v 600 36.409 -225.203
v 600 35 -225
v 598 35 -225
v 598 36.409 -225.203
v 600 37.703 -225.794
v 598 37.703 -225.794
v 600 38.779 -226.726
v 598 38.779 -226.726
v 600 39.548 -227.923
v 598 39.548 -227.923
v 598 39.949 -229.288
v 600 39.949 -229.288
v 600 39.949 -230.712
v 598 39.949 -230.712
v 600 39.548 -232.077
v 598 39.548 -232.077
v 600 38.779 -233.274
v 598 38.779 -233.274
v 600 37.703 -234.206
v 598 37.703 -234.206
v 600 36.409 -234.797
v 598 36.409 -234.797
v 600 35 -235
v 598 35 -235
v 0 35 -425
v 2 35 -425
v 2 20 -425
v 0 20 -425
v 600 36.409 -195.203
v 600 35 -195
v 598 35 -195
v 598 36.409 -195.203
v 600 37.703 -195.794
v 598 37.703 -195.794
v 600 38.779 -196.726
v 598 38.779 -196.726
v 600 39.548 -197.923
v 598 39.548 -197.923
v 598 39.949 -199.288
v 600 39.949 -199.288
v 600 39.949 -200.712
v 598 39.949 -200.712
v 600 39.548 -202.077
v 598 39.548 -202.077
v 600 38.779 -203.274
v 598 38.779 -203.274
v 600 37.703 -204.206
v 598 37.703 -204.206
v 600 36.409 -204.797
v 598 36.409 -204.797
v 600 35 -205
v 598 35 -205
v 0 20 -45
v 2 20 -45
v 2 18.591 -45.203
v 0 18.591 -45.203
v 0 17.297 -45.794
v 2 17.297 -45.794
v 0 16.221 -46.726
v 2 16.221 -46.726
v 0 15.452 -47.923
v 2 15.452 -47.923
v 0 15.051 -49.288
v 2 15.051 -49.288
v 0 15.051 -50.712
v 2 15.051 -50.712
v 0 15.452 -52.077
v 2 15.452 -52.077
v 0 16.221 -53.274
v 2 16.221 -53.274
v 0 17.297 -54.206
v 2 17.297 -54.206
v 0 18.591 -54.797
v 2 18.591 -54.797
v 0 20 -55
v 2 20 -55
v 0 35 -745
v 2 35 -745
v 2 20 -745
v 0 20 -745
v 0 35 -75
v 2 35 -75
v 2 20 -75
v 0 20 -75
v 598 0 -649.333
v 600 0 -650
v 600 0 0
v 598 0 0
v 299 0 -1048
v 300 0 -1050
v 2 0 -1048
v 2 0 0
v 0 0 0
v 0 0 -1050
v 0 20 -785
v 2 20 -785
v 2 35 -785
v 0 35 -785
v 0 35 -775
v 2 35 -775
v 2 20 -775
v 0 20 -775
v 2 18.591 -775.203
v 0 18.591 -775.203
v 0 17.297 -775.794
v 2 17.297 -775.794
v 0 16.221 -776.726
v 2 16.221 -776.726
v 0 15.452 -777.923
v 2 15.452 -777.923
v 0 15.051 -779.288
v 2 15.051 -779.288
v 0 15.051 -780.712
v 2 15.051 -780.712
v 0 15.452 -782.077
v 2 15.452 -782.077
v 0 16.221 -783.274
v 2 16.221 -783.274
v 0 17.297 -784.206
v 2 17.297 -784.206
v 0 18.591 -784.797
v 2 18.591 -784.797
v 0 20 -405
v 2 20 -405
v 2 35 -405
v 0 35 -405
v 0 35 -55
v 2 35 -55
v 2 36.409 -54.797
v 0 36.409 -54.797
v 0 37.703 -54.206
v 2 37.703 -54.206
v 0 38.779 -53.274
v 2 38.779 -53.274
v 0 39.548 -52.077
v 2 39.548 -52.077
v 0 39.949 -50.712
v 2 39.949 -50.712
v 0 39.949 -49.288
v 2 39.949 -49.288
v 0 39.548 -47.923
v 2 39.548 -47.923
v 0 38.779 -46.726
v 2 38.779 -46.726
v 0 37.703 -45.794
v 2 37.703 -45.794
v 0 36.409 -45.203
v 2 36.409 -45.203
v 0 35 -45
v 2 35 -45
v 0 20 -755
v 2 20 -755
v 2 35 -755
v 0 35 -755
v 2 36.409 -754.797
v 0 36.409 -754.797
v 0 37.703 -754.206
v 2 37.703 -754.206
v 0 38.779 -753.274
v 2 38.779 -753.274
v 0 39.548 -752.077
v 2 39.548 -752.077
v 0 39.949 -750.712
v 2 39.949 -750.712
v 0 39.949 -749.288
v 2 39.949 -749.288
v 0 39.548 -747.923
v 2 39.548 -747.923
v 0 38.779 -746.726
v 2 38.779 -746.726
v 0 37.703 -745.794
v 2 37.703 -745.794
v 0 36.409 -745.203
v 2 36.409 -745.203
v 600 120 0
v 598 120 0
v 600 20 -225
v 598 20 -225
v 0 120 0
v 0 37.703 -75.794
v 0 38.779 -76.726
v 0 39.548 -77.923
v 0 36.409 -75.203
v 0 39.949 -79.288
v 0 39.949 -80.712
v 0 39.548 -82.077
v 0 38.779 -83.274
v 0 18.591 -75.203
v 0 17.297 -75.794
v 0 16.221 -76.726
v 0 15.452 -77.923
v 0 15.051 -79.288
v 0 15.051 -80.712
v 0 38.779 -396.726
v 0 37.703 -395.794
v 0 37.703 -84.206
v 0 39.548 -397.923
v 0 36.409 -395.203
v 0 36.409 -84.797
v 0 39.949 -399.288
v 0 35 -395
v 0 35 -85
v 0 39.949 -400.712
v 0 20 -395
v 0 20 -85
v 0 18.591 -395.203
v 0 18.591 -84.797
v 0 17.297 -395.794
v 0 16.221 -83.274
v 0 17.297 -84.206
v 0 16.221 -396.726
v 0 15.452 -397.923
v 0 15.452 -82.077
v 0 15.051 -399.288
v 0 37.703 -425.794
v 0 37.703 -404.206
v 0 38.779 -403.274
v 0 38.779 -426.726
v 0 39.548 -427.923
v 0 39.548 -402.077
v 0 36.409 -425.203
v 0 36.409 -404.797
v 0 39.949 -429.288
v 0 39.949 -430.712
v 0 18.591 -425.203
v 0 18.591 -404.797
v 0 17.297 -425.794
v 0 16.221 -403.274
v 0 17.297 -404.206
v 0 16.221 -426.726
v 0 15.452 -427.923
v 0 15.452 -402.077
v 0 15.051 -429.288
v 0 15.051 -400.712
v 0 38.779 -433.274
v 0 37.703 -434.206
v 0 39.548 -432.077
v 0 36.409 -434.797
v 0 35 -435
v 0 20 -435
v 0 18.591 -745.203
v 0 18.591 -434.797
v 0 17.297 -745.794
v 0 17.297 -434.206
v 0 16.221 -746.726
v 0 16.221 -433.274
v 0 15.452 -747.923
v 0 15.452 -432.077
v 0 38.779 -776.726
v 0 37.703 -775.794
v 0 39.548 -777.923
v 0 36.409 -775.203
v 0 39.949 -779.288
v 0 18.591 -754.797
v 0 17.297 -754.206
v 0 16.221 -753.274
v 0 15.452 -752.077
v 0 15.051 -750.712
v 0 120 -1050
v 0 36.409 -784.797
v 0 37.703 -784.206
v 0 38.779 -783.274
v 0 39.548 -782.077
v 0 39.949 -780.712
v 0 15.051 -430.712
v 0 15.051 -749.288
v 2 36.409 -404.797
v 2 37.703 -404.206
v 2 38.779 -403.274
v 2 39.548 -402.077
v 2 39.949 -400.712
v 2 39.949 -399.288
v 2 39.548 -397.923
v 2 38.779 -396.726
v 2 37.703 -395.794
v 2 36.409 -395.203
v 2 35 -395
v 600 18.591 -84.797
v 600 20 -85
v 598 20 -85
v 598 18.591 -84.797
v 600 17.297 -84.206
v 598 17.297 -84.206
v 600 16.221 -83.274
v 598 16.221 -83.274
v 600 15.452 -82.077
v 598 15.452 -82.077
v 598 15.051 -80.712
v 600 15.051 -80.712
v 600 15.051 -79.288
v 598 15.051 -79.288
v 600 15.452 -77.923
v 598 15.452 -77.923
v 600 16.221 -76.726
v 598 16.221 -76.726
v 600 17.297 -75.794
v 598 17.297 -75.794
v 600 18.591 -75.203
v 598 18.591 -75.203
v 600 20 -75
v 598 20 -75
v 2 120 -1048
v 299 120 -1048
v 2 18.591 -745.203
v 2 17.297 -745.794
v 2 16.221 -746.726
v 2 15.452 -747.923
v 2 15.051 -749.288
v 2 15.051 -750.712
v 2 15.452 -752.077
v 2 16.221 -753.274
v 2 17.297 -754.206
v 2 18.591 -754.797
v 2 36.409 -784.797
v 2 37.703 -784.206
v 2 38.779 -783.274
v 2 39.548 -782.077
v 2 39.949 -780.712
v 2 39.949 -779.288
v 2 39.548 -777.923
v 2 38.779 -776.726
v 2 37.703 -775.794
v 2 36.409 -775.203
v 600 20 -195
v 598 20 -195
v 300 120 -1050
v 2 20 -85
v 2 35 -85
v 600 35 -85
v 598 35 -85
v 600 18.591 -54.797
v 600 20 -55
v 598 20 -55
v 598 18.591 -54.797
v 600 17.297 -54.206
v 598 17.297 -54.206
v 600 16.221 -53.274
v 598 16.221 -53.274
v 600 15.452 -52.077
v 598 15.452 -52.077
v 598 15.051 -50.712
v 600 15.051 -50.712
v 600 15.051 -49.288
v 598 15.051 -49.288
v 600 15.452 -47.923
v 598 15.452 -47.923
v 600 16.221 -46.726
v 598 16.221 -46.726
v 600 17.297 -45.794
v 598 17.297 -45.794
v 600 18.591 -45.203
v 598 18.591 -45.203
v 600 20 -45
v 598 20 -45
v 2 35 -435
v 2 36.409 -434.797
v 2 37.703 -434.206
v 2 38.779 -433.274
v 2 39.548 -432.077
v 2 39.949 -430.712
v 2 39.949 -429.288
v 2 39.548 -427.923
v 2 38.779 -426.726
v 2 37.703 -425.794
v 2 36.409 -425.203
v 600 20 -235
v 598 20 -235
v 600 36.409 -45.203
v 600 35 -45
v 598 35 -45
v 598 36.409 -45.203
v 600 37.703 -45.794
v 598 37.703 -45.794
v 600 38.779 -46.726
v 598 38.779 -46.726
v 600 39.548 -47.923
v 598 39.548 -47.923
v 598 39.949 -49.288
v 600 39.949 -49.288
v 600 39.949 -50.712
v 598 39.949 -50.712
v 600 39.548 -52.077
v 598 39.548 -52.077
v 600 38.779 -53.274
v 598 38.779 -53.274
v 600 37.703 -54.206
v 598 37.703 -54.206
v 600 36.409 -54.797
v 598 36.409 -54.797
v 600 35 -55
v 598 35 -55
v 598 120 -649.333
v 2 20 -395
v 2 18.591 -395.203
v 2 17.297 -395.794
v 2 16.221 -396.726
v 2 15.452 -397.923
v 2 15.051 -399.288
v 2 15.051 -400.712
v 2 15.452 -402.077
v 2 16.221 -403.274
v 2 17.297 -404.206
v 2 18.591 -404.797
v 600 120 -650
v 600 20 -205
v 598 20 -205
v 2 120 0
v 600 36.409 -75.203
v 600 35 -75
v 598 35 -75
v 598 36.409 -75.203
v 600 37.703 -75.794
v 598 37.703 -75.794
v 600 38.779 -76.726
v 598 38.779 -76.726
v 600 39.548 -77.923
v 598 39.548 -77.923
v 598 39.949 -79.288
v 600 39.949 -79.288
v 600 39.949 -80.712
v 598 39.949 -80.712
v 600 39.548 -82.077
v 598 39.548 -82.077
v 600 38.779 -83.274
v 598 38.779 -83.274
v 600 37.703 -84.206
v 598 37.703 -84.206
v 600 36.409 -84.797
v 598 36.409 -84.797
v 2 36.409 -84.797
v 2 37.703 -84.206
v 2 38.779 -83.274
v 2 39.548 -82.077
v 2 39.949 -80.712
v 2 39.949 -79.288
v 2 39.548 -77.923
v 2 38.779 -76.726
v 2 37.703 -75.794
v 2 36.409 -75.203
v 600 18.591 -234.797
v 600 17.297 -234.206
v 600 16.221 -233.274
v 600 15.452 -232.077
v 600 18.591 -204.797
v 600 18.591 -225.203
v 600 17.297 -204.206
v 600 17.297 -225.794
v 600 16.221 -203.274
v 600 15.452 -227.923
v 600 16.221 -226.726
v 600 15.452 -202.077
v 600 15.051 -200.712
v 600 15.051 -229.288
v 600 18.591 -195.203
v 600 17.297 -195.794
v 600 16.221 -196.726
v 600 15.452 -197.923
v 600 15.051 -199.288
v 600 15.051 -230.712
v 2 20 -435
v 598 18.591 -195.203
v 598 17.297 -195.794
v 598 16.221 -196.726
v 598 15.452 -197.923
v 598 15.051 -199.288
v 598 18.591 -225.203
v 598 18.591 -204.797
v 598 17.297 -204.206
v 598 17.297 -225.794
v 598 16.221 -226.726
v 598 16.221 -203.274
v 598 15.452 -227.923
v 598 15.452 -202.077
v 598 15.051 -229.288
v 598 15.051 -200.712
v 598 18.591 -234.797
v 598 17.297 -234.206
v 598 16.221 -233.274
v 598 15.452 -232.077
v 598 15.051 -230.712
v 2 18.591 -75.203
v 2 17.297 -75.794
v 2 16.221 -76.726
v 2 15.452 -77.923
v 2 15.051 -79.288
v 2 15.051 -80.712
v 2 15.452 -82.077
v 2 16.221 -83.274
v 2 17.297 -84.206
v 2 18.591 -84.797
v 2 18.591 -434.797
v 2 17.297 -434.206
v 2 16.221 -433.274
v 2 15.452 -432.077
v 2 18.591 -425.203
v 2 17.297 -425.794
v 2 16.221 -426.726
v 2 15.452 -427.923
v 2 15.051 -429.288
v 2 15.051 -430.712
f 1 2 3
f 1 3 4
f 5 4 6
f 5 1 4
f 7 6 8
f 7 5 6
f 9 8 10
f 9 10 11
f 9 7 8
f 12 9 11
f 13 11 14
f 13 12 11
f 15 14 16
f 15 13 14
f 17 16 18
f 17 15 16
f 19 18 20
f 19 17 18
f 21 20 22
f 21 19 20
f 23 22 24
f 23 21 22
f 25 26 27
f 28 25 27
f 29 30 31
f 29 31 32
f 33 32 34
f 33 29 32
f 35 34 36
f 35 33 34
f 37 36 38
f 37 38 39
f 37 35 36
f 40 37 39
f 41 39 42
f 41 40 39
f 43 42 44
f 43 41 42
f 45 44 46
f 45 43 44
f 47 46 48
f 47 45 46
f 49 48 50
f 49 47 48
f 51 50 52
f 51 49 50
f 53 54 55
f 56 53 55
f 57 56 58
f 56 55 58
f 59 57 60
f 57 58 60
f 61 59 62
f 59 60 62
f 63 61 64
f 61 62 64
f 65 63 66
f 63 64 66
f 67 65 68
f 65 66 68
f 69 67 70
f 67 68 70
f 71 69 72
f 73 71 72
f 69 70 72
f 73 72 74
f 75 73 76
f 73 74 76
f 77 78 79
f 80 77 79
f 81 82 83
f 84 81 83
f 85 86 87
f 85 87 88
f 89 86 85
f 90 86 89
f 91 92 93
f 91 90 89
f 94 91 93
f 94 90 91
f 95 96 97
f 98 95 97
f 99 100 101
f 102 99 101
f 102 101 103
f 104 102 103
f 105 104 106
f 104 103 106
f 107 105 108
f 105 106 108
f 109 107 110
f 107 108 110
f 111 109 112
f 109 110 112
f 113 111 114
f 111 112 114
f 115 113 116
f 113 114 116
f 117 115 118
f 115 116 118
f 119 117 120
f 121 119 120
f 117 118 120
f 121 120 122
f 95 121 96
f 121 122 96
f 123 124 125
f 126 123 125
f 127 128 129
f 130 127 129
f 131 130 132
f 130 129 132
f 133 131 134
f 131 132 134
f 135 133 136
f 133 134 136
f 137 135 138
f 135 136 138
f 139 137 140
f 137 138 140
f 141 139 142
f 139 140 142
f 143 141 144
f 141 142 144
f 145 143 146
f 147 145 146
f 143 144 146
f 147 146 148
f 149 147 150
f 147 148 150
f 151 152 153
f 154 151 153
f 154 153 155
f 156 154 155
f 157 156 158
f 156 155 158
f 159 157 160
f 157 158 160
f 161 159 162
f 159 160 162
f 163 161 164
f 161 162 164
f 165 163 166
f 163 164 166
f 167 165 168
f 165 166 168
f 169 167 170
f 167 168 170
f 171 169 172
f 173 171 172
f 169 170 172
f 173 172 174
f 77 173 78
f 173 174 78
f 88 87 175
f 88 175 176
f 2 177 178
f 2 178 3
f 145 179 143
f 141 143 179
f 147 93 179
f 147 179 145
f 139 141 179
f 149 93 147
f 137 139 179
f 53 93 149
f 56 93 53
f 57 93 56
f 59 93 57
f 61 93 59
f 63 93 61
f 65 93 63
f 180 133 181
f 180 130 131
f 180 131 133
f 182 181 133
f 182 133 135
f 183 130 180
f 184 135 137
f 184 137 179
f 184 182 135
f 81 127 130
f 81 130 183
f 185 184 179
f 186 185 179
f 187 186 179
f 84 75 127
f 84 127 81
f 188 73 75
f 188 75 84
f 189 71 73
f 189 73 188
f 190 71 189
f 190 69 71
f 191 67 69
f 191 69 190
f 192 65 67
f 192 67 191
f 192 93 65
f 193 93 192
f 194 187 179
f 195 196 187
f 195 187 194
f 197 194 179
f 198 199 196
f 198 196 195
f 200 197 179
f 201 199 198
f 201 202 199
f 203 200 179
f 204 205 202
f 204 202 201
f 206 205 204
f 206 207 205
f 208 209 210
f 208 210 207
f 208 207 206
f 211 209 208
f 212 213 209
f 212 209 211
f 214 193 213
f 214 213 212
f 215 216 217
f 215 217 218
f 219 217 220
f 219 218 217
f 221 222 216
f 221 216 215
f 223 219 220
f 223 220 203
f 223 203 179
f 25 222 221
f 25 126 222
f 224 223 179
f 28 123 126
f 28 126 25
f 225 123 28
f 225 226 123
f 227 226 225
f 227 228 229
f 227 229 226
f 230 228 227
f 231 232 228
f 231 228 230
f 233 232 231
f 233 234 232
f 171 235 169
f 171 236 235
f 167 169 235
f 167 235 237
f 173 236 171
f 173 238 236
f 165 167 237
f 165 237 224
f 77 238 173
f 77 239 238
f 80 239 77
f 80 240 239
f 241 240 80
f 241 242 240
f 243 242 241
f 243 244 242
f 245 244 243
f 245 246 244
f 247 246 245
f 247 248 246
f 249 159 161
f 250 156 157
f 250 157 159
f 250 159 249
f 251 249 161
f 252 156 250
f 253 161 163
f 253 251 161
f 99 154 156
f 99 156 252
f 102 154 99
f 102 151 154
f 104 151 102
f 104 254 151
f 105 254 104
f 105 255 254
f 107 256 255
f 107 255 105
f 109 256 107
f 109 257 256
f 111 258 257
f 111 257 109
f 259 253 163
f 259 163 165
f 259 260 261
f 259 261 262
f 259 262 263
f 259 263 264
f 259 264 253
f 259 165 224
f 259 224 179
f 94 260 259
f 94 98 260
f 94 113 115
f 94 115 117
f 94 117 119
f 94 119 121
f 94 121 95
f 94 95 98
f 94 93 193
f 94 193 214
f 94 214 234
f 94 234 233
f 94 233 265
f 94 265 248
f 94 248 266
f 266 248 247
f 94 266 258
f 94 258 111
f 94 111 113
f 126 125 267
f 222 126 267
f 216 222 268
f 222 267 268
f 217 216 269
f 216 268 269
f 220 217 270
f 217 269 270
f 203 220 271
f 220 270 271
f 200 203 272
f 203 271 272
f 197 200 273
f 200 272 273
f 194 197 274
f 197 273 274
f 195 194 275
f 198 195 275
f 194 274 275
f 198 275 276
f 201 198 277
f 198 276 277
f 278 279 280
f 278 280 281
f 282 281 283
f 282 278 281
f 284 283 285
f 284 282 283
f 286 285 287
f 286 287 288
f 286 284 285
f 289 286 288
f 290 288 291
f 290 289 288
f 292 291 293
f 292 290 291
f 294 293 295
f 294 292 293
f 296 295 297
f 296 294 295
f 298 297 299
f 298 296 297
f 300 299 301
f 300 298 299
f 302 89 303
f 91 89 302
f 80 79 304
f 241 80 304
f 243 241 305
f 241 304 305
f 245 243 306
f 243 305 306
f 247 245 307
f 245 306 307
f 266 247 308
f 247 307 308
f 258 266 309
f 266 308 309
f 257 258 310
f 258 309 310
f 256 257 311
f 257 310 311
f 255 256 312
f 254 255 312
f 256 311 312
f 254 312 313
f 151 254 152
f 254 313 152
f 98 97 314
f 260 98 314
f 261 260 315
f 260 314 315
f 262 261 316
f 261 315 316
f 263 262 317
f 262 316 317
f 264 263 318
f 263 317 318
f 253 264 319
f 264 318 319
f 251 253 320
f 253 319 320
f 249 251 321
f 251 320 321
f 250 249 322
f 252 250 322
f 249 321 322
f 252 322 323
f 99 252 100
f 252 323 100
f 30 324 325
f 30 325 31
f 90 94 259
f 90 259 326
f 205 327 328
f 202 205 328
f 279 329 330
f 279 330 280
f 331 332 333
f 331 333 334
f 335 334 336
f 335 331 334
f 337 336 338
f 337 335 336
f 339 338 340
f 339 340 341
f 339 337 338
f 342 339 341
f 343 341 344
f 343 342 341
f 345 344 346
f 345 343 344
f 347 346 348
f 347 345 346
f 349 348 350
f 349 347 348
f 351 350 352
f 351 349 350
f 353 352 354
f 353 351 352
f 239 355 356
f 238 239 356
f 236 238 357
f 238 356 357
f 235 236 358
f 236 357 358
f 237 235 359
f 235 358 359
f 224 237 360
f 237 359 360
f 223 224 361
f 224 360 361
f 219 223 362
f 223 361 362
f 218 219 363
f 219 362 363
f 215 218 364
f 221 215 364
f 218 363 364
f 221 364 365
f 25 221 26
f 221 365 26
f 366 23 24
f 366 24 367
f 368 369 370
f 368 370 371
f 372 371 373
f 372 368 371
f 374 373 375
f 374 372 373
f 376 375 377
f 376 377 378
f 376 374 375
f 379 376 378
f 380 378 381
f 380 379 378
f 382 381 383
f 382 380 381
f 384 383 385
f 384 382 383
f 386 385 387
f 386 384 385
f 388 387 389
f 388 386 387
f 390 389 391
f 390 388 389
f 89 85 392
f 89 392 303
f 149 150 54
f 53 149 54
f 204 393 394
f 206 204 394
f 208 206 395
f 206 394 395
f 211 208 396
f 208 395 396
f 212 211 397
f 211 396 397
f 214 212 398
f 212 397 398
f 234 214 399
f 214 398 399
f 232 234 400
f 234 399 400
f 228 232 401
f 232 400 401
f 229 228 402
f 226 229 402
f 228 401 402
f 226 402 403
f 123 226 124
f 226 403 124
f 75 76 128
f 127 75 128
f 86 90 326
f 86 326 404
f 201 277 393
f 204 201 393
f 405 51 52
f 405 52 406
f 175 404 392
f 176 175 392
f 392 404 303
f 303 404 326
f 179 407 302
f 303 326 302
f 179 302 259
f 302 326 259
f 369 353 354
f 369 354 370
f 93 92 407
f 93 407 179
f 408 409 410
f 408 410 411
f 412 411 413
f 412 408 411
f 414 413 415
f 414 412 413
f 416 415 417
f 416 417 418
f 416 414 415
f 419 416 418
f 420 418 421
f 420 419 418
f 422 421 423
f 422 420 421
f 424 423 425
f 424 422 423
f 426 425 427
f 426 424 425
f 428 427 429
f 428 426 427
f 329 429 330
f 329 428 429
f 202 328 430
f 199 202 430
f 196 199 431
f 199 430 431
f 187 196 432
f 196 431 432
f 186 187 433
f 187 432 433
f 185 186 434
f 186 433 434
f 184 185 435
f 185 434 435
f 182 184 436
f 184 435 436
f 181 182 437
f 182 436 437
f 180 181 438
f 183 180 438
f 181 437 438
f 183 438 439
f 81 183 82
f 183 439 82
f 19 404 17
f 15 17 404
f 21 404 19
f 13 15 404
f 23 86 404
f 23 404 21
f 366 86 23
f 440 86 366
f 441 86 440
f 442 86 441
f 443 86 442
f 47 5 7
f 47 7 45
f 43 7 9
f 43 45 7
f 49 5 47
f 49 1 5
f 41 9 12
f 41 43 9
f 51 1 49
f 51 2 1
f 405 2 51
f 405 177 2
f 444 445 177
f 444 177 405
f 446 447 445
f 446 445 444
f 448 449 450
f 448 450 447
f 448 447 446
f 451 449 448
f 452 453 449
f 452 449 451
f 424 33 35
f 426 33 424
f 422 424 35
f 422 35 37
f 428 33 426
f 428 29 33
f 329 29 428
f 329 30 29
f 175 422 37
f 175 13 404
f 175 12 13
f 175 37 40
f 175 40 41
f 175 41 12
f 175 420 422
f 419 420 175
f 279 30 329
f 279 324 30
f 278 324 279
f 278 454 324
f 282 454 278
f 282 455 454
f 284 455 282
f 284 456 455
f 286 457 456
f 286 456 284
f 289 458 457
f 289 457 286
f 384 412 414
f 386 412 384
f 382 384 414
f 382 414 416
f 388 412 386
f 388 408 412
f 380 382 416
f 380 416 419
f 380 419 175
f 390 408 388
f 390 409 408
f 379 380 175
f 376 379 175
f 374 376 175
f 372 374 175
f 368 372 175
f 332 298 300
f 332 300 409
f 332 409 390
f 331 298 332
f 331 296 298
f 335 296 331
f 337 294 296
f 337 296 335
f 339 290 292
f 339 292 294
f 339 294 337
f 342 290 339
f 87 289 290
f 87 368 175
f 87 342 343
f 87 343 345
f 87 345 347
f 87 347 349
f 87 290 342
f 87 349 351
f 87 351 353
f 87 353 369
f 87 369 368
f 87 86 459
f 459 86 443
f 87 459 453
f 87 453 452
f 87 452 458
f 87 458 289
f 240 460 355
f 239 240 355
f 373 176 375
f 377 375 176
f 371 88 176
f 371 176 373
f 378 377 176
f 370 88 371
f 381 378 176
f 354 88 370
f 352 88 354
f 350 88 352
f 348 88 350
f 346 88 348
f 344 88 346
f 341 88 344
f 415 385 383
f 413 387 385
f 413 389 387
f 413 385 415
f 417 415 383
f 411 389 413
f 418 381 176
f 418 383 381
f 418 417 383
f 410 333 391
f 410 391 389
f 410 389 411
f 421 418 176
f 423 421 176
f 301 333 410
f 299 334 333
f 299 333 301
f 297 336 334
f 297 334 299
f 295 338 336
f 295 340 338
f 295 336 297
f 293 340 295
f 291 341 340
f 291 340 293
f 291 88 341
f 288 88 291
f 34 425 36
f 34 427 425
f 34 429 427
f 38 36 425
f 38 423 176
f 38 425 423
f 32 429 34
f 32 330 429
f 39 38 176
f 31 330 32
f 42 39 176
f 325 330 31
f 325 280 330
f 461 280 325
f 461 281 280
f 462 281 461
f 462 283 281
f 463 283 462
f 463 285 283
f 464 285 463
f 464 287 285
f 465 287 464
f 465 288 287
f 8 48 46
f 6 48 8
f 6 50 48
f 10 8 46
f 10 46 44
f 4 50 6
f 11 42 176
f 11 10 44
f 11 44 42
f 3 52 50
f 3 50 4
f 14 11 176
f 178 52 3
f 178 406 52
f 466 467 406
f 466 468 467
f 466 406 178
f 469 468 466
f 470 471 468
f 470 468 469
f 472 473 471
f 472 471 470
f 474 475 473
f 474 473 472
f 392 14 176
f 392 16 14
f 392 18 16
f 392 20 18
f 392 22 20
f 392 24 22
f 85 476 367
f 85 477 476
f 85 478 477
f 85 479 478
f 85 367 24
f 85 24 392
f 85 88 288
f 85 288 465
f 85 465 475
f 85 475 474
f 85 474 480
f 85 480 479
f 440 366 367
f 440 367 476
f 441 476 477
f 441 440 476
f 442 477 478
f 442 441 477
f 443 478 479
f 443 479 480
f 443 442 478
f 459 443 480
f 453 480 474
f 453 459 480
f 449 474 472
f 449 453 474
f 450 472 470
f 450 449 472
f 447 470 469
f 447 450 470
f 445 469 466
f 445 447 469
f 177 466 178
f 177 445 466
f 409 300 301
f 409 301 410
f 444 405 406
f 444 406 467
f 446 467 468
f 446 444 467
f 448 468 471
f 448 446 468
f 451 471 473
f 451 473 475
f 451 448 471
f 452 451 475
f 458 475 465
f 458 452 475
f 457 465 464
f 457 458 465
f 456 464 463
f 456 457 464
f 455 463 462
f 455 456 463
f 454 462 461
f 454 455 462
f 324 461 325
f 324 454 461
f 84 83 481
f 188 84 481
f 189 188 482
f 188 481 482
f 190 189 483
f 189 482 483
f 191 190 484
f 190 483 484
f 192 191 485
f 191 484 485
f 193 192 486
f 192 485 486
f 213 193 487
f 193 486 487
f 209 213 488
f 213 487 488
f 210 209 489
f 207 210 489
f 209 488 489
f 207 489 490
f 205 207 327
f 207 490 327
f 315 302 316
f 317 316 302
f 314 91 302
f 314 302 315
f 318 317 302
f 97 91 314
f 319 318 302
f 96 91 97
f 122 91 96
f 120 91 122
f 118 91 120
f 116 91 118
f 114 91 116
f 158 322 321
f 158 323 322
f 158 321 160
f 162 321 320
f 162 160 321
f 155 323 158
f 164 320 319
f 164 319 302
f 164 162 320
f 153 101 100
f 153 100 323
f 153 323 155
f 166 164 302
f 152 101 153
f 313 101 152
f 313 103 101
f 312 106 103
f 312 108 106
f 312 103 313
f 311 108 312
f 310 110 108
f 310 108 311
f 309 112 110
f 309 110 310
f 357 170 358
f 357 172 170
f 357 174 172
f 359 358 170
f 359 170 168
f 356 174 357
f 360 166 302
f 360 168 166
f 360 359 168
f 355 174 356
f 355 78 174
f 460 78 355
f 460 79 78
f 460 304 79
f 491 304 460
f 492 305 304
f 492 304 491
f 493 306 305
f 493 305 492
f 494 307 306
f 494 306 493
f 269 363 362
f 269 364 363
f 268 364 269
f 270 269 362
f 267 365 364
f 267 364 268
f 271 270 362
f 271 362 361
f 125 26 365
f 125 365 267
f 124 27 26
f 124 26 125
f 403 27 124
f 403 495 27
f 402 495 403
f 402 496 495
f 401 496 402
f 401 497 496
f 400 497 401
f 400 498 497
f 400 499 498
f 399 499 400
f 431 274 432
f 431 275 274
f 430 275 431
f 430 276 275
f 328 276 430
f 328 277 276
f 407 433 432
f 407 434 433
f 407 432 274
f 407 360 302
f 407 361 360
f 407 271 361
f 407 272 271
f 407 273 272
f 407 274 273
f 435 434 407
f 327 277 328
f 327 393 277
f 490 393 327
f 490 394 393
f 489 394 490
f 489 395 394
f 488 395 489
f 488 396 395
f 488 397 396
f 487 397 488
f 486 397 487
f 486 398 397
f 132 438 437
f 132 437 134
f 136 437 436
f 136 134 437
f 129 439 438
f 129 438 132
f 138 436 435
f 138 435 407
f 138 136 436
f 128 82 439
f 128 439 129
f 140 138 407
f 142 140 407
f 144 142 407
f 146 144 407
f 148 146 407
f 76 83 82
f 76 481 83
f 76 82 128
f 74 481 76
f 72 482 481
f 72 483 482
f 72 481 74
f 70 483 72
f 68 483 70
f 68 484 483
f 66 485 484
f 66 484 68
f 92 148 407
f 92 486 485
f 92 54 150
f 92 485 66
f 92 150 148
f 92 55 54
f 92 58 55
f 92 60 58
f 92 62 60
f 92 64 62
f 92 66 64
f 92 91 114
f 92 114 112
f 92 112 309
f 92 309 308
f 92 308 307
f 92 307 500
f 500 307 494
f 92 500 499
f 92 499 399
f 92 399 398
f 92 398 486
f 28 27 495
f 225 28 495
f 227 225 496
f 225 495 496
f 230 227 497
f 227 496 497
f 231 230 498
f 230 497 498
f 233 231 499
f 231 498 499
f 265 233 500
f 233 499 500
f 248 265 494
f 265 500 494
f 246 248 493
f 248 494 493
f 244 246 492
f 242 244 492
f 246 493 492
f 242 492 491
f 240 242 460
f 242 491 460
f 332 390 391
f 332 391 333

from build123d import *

# Parameters (mm, degrees)
BOSS_EXTRUDE1_DEPTH = 120
CUT_EXTRUDE2_DEPTH  = 2
CUT_EXTRUDE3_START  = -2
CUT_EXTRUDE3_DEPTH  = 2


with BuildPart() as part:
    # Sketch1 → Boss-Extrude1 (new body)
    with BuildSketch(Plane(origin=(0, 0, 0), x_dir=(1, 0, 0), z_dir=(0, 1, 0))):
        Polygon((0, 0), (0, 1050), (300, 1050), (600, 650), (600, 0), (598, 0), (598, 649.333333333), (299, 1048), (2, 1048), (2, 0), align=None)
    extrude(amount=BOSS_EXTRUDE1_DEPTH)

    # Sketch7 → Cut-Extrude2 (cut)
    with BuildSketch(Plane(origin=(600, 0, 0), x_dir=(0, 0, -1), z_dir=(1, 0, 0))):
        with BuildLine():
            Line((45, 20), (45, 35))
            ThreePointArc((45, 35), (50, 40), (55, 35))
            Line((55, 35), (55, 20))
            ThreePointArc((55, 20), (50, 15), (45, 20))
        make_face()
        with BuildLine():
            Line((75, 20), (75, 35))
            ThreePointArc((75, 35), (80, 40), (85, 35))
            Line((85, 35), (85, 20))
            ThreePointArc((85, 20), (80, 15), (75, 20))
        make_face()
        with BuildLine():
            Line((195, 20), (195, 35))
            ThreePointArc((195, 35), (200, 40), (205, 35))
            Line((205, 35), (205, 20))
            ThreePointArc((205, 20), (200, 15), (195, 20))
        make_face()
        with BuildLine():
            Line((225, 20), (225, 35))
            ThreePointArc((225, 35), (230, 40), (235, 35))
            Line((235, 35), (235, 20))
            ThreePointArc((235, 20), (230, 15), (225, 20))
        make_face()
    extrude(amount=-CUT_EXTRUDE2_DEPTH, mode=Mode.SUBTRACT)

    # Sketch8 → Cut-Extrude3 (cut)
    with BuildSketch(Plane.ZY.offset(CUT_EXTRUDE3_START)):
        with BuildLine():
            Line((-45, 35), (-45, 20))
            ThreePointArc((-45, 20), (-50, 15), (-55, 20))
            Line((-55, 20), (-55, 35))
            ThreePointArc((-55, 35), (-50, 40), (-45, 35))
        make_face()
        with BuildLine():
            Line((-75, 35), (-75, 20))
            ThreePointArc((-75, 20), (-80, 15), (-85, 20))
            Line((-85, 20), (-85, 35))
            ThreePointArc((-85, 35), (-80, 40), (-75, 35))
        make_face()
        with BuildLine():
            Line((-395, 35), (-395, 20))
            ThreePointArc((-395, 20), (-400, 15), (-405, 20))
            Line((-405, 20), (-405, 35))
            ThreePointArc((-405, 35), (-400, 40), (-395, 35))
        make_face()
        with BuildLine():
            Line((-425, 35), (-425, 20))
            ThreePointArc((-425, 20), (-430, 15), (-435, 20))
            Line((-435, 20), (-435, 35))
            ThreePointArc((-435, 35), (-430, 40), (-425, 35))
        make_face()
        with BuildLine():
            Line((-745, 35), (-745, 20))
            ThreePointArc((-745, 20), (-750, 15), (-755, 20))
            Line((-755, 20), (-755, 35))
            ThreePointArc((-755, 35), (-750, 40), (-745, 35))
        make_face()
        with BuildLine():
            Line((-775, 35), (-775, 20))
            ThreePointArc((-775, 20), (-780, 15), (-785, 20))
            Line((-785, 20), (-785, 35))
            ThreePointArc((-785, 35), (-780, 40), (-775, 35))
        make_face()
    extrude(amount=CUT_EXTRUDE3_DEPTH, mode=Mode.SUBTRACT)


solid = part.part
